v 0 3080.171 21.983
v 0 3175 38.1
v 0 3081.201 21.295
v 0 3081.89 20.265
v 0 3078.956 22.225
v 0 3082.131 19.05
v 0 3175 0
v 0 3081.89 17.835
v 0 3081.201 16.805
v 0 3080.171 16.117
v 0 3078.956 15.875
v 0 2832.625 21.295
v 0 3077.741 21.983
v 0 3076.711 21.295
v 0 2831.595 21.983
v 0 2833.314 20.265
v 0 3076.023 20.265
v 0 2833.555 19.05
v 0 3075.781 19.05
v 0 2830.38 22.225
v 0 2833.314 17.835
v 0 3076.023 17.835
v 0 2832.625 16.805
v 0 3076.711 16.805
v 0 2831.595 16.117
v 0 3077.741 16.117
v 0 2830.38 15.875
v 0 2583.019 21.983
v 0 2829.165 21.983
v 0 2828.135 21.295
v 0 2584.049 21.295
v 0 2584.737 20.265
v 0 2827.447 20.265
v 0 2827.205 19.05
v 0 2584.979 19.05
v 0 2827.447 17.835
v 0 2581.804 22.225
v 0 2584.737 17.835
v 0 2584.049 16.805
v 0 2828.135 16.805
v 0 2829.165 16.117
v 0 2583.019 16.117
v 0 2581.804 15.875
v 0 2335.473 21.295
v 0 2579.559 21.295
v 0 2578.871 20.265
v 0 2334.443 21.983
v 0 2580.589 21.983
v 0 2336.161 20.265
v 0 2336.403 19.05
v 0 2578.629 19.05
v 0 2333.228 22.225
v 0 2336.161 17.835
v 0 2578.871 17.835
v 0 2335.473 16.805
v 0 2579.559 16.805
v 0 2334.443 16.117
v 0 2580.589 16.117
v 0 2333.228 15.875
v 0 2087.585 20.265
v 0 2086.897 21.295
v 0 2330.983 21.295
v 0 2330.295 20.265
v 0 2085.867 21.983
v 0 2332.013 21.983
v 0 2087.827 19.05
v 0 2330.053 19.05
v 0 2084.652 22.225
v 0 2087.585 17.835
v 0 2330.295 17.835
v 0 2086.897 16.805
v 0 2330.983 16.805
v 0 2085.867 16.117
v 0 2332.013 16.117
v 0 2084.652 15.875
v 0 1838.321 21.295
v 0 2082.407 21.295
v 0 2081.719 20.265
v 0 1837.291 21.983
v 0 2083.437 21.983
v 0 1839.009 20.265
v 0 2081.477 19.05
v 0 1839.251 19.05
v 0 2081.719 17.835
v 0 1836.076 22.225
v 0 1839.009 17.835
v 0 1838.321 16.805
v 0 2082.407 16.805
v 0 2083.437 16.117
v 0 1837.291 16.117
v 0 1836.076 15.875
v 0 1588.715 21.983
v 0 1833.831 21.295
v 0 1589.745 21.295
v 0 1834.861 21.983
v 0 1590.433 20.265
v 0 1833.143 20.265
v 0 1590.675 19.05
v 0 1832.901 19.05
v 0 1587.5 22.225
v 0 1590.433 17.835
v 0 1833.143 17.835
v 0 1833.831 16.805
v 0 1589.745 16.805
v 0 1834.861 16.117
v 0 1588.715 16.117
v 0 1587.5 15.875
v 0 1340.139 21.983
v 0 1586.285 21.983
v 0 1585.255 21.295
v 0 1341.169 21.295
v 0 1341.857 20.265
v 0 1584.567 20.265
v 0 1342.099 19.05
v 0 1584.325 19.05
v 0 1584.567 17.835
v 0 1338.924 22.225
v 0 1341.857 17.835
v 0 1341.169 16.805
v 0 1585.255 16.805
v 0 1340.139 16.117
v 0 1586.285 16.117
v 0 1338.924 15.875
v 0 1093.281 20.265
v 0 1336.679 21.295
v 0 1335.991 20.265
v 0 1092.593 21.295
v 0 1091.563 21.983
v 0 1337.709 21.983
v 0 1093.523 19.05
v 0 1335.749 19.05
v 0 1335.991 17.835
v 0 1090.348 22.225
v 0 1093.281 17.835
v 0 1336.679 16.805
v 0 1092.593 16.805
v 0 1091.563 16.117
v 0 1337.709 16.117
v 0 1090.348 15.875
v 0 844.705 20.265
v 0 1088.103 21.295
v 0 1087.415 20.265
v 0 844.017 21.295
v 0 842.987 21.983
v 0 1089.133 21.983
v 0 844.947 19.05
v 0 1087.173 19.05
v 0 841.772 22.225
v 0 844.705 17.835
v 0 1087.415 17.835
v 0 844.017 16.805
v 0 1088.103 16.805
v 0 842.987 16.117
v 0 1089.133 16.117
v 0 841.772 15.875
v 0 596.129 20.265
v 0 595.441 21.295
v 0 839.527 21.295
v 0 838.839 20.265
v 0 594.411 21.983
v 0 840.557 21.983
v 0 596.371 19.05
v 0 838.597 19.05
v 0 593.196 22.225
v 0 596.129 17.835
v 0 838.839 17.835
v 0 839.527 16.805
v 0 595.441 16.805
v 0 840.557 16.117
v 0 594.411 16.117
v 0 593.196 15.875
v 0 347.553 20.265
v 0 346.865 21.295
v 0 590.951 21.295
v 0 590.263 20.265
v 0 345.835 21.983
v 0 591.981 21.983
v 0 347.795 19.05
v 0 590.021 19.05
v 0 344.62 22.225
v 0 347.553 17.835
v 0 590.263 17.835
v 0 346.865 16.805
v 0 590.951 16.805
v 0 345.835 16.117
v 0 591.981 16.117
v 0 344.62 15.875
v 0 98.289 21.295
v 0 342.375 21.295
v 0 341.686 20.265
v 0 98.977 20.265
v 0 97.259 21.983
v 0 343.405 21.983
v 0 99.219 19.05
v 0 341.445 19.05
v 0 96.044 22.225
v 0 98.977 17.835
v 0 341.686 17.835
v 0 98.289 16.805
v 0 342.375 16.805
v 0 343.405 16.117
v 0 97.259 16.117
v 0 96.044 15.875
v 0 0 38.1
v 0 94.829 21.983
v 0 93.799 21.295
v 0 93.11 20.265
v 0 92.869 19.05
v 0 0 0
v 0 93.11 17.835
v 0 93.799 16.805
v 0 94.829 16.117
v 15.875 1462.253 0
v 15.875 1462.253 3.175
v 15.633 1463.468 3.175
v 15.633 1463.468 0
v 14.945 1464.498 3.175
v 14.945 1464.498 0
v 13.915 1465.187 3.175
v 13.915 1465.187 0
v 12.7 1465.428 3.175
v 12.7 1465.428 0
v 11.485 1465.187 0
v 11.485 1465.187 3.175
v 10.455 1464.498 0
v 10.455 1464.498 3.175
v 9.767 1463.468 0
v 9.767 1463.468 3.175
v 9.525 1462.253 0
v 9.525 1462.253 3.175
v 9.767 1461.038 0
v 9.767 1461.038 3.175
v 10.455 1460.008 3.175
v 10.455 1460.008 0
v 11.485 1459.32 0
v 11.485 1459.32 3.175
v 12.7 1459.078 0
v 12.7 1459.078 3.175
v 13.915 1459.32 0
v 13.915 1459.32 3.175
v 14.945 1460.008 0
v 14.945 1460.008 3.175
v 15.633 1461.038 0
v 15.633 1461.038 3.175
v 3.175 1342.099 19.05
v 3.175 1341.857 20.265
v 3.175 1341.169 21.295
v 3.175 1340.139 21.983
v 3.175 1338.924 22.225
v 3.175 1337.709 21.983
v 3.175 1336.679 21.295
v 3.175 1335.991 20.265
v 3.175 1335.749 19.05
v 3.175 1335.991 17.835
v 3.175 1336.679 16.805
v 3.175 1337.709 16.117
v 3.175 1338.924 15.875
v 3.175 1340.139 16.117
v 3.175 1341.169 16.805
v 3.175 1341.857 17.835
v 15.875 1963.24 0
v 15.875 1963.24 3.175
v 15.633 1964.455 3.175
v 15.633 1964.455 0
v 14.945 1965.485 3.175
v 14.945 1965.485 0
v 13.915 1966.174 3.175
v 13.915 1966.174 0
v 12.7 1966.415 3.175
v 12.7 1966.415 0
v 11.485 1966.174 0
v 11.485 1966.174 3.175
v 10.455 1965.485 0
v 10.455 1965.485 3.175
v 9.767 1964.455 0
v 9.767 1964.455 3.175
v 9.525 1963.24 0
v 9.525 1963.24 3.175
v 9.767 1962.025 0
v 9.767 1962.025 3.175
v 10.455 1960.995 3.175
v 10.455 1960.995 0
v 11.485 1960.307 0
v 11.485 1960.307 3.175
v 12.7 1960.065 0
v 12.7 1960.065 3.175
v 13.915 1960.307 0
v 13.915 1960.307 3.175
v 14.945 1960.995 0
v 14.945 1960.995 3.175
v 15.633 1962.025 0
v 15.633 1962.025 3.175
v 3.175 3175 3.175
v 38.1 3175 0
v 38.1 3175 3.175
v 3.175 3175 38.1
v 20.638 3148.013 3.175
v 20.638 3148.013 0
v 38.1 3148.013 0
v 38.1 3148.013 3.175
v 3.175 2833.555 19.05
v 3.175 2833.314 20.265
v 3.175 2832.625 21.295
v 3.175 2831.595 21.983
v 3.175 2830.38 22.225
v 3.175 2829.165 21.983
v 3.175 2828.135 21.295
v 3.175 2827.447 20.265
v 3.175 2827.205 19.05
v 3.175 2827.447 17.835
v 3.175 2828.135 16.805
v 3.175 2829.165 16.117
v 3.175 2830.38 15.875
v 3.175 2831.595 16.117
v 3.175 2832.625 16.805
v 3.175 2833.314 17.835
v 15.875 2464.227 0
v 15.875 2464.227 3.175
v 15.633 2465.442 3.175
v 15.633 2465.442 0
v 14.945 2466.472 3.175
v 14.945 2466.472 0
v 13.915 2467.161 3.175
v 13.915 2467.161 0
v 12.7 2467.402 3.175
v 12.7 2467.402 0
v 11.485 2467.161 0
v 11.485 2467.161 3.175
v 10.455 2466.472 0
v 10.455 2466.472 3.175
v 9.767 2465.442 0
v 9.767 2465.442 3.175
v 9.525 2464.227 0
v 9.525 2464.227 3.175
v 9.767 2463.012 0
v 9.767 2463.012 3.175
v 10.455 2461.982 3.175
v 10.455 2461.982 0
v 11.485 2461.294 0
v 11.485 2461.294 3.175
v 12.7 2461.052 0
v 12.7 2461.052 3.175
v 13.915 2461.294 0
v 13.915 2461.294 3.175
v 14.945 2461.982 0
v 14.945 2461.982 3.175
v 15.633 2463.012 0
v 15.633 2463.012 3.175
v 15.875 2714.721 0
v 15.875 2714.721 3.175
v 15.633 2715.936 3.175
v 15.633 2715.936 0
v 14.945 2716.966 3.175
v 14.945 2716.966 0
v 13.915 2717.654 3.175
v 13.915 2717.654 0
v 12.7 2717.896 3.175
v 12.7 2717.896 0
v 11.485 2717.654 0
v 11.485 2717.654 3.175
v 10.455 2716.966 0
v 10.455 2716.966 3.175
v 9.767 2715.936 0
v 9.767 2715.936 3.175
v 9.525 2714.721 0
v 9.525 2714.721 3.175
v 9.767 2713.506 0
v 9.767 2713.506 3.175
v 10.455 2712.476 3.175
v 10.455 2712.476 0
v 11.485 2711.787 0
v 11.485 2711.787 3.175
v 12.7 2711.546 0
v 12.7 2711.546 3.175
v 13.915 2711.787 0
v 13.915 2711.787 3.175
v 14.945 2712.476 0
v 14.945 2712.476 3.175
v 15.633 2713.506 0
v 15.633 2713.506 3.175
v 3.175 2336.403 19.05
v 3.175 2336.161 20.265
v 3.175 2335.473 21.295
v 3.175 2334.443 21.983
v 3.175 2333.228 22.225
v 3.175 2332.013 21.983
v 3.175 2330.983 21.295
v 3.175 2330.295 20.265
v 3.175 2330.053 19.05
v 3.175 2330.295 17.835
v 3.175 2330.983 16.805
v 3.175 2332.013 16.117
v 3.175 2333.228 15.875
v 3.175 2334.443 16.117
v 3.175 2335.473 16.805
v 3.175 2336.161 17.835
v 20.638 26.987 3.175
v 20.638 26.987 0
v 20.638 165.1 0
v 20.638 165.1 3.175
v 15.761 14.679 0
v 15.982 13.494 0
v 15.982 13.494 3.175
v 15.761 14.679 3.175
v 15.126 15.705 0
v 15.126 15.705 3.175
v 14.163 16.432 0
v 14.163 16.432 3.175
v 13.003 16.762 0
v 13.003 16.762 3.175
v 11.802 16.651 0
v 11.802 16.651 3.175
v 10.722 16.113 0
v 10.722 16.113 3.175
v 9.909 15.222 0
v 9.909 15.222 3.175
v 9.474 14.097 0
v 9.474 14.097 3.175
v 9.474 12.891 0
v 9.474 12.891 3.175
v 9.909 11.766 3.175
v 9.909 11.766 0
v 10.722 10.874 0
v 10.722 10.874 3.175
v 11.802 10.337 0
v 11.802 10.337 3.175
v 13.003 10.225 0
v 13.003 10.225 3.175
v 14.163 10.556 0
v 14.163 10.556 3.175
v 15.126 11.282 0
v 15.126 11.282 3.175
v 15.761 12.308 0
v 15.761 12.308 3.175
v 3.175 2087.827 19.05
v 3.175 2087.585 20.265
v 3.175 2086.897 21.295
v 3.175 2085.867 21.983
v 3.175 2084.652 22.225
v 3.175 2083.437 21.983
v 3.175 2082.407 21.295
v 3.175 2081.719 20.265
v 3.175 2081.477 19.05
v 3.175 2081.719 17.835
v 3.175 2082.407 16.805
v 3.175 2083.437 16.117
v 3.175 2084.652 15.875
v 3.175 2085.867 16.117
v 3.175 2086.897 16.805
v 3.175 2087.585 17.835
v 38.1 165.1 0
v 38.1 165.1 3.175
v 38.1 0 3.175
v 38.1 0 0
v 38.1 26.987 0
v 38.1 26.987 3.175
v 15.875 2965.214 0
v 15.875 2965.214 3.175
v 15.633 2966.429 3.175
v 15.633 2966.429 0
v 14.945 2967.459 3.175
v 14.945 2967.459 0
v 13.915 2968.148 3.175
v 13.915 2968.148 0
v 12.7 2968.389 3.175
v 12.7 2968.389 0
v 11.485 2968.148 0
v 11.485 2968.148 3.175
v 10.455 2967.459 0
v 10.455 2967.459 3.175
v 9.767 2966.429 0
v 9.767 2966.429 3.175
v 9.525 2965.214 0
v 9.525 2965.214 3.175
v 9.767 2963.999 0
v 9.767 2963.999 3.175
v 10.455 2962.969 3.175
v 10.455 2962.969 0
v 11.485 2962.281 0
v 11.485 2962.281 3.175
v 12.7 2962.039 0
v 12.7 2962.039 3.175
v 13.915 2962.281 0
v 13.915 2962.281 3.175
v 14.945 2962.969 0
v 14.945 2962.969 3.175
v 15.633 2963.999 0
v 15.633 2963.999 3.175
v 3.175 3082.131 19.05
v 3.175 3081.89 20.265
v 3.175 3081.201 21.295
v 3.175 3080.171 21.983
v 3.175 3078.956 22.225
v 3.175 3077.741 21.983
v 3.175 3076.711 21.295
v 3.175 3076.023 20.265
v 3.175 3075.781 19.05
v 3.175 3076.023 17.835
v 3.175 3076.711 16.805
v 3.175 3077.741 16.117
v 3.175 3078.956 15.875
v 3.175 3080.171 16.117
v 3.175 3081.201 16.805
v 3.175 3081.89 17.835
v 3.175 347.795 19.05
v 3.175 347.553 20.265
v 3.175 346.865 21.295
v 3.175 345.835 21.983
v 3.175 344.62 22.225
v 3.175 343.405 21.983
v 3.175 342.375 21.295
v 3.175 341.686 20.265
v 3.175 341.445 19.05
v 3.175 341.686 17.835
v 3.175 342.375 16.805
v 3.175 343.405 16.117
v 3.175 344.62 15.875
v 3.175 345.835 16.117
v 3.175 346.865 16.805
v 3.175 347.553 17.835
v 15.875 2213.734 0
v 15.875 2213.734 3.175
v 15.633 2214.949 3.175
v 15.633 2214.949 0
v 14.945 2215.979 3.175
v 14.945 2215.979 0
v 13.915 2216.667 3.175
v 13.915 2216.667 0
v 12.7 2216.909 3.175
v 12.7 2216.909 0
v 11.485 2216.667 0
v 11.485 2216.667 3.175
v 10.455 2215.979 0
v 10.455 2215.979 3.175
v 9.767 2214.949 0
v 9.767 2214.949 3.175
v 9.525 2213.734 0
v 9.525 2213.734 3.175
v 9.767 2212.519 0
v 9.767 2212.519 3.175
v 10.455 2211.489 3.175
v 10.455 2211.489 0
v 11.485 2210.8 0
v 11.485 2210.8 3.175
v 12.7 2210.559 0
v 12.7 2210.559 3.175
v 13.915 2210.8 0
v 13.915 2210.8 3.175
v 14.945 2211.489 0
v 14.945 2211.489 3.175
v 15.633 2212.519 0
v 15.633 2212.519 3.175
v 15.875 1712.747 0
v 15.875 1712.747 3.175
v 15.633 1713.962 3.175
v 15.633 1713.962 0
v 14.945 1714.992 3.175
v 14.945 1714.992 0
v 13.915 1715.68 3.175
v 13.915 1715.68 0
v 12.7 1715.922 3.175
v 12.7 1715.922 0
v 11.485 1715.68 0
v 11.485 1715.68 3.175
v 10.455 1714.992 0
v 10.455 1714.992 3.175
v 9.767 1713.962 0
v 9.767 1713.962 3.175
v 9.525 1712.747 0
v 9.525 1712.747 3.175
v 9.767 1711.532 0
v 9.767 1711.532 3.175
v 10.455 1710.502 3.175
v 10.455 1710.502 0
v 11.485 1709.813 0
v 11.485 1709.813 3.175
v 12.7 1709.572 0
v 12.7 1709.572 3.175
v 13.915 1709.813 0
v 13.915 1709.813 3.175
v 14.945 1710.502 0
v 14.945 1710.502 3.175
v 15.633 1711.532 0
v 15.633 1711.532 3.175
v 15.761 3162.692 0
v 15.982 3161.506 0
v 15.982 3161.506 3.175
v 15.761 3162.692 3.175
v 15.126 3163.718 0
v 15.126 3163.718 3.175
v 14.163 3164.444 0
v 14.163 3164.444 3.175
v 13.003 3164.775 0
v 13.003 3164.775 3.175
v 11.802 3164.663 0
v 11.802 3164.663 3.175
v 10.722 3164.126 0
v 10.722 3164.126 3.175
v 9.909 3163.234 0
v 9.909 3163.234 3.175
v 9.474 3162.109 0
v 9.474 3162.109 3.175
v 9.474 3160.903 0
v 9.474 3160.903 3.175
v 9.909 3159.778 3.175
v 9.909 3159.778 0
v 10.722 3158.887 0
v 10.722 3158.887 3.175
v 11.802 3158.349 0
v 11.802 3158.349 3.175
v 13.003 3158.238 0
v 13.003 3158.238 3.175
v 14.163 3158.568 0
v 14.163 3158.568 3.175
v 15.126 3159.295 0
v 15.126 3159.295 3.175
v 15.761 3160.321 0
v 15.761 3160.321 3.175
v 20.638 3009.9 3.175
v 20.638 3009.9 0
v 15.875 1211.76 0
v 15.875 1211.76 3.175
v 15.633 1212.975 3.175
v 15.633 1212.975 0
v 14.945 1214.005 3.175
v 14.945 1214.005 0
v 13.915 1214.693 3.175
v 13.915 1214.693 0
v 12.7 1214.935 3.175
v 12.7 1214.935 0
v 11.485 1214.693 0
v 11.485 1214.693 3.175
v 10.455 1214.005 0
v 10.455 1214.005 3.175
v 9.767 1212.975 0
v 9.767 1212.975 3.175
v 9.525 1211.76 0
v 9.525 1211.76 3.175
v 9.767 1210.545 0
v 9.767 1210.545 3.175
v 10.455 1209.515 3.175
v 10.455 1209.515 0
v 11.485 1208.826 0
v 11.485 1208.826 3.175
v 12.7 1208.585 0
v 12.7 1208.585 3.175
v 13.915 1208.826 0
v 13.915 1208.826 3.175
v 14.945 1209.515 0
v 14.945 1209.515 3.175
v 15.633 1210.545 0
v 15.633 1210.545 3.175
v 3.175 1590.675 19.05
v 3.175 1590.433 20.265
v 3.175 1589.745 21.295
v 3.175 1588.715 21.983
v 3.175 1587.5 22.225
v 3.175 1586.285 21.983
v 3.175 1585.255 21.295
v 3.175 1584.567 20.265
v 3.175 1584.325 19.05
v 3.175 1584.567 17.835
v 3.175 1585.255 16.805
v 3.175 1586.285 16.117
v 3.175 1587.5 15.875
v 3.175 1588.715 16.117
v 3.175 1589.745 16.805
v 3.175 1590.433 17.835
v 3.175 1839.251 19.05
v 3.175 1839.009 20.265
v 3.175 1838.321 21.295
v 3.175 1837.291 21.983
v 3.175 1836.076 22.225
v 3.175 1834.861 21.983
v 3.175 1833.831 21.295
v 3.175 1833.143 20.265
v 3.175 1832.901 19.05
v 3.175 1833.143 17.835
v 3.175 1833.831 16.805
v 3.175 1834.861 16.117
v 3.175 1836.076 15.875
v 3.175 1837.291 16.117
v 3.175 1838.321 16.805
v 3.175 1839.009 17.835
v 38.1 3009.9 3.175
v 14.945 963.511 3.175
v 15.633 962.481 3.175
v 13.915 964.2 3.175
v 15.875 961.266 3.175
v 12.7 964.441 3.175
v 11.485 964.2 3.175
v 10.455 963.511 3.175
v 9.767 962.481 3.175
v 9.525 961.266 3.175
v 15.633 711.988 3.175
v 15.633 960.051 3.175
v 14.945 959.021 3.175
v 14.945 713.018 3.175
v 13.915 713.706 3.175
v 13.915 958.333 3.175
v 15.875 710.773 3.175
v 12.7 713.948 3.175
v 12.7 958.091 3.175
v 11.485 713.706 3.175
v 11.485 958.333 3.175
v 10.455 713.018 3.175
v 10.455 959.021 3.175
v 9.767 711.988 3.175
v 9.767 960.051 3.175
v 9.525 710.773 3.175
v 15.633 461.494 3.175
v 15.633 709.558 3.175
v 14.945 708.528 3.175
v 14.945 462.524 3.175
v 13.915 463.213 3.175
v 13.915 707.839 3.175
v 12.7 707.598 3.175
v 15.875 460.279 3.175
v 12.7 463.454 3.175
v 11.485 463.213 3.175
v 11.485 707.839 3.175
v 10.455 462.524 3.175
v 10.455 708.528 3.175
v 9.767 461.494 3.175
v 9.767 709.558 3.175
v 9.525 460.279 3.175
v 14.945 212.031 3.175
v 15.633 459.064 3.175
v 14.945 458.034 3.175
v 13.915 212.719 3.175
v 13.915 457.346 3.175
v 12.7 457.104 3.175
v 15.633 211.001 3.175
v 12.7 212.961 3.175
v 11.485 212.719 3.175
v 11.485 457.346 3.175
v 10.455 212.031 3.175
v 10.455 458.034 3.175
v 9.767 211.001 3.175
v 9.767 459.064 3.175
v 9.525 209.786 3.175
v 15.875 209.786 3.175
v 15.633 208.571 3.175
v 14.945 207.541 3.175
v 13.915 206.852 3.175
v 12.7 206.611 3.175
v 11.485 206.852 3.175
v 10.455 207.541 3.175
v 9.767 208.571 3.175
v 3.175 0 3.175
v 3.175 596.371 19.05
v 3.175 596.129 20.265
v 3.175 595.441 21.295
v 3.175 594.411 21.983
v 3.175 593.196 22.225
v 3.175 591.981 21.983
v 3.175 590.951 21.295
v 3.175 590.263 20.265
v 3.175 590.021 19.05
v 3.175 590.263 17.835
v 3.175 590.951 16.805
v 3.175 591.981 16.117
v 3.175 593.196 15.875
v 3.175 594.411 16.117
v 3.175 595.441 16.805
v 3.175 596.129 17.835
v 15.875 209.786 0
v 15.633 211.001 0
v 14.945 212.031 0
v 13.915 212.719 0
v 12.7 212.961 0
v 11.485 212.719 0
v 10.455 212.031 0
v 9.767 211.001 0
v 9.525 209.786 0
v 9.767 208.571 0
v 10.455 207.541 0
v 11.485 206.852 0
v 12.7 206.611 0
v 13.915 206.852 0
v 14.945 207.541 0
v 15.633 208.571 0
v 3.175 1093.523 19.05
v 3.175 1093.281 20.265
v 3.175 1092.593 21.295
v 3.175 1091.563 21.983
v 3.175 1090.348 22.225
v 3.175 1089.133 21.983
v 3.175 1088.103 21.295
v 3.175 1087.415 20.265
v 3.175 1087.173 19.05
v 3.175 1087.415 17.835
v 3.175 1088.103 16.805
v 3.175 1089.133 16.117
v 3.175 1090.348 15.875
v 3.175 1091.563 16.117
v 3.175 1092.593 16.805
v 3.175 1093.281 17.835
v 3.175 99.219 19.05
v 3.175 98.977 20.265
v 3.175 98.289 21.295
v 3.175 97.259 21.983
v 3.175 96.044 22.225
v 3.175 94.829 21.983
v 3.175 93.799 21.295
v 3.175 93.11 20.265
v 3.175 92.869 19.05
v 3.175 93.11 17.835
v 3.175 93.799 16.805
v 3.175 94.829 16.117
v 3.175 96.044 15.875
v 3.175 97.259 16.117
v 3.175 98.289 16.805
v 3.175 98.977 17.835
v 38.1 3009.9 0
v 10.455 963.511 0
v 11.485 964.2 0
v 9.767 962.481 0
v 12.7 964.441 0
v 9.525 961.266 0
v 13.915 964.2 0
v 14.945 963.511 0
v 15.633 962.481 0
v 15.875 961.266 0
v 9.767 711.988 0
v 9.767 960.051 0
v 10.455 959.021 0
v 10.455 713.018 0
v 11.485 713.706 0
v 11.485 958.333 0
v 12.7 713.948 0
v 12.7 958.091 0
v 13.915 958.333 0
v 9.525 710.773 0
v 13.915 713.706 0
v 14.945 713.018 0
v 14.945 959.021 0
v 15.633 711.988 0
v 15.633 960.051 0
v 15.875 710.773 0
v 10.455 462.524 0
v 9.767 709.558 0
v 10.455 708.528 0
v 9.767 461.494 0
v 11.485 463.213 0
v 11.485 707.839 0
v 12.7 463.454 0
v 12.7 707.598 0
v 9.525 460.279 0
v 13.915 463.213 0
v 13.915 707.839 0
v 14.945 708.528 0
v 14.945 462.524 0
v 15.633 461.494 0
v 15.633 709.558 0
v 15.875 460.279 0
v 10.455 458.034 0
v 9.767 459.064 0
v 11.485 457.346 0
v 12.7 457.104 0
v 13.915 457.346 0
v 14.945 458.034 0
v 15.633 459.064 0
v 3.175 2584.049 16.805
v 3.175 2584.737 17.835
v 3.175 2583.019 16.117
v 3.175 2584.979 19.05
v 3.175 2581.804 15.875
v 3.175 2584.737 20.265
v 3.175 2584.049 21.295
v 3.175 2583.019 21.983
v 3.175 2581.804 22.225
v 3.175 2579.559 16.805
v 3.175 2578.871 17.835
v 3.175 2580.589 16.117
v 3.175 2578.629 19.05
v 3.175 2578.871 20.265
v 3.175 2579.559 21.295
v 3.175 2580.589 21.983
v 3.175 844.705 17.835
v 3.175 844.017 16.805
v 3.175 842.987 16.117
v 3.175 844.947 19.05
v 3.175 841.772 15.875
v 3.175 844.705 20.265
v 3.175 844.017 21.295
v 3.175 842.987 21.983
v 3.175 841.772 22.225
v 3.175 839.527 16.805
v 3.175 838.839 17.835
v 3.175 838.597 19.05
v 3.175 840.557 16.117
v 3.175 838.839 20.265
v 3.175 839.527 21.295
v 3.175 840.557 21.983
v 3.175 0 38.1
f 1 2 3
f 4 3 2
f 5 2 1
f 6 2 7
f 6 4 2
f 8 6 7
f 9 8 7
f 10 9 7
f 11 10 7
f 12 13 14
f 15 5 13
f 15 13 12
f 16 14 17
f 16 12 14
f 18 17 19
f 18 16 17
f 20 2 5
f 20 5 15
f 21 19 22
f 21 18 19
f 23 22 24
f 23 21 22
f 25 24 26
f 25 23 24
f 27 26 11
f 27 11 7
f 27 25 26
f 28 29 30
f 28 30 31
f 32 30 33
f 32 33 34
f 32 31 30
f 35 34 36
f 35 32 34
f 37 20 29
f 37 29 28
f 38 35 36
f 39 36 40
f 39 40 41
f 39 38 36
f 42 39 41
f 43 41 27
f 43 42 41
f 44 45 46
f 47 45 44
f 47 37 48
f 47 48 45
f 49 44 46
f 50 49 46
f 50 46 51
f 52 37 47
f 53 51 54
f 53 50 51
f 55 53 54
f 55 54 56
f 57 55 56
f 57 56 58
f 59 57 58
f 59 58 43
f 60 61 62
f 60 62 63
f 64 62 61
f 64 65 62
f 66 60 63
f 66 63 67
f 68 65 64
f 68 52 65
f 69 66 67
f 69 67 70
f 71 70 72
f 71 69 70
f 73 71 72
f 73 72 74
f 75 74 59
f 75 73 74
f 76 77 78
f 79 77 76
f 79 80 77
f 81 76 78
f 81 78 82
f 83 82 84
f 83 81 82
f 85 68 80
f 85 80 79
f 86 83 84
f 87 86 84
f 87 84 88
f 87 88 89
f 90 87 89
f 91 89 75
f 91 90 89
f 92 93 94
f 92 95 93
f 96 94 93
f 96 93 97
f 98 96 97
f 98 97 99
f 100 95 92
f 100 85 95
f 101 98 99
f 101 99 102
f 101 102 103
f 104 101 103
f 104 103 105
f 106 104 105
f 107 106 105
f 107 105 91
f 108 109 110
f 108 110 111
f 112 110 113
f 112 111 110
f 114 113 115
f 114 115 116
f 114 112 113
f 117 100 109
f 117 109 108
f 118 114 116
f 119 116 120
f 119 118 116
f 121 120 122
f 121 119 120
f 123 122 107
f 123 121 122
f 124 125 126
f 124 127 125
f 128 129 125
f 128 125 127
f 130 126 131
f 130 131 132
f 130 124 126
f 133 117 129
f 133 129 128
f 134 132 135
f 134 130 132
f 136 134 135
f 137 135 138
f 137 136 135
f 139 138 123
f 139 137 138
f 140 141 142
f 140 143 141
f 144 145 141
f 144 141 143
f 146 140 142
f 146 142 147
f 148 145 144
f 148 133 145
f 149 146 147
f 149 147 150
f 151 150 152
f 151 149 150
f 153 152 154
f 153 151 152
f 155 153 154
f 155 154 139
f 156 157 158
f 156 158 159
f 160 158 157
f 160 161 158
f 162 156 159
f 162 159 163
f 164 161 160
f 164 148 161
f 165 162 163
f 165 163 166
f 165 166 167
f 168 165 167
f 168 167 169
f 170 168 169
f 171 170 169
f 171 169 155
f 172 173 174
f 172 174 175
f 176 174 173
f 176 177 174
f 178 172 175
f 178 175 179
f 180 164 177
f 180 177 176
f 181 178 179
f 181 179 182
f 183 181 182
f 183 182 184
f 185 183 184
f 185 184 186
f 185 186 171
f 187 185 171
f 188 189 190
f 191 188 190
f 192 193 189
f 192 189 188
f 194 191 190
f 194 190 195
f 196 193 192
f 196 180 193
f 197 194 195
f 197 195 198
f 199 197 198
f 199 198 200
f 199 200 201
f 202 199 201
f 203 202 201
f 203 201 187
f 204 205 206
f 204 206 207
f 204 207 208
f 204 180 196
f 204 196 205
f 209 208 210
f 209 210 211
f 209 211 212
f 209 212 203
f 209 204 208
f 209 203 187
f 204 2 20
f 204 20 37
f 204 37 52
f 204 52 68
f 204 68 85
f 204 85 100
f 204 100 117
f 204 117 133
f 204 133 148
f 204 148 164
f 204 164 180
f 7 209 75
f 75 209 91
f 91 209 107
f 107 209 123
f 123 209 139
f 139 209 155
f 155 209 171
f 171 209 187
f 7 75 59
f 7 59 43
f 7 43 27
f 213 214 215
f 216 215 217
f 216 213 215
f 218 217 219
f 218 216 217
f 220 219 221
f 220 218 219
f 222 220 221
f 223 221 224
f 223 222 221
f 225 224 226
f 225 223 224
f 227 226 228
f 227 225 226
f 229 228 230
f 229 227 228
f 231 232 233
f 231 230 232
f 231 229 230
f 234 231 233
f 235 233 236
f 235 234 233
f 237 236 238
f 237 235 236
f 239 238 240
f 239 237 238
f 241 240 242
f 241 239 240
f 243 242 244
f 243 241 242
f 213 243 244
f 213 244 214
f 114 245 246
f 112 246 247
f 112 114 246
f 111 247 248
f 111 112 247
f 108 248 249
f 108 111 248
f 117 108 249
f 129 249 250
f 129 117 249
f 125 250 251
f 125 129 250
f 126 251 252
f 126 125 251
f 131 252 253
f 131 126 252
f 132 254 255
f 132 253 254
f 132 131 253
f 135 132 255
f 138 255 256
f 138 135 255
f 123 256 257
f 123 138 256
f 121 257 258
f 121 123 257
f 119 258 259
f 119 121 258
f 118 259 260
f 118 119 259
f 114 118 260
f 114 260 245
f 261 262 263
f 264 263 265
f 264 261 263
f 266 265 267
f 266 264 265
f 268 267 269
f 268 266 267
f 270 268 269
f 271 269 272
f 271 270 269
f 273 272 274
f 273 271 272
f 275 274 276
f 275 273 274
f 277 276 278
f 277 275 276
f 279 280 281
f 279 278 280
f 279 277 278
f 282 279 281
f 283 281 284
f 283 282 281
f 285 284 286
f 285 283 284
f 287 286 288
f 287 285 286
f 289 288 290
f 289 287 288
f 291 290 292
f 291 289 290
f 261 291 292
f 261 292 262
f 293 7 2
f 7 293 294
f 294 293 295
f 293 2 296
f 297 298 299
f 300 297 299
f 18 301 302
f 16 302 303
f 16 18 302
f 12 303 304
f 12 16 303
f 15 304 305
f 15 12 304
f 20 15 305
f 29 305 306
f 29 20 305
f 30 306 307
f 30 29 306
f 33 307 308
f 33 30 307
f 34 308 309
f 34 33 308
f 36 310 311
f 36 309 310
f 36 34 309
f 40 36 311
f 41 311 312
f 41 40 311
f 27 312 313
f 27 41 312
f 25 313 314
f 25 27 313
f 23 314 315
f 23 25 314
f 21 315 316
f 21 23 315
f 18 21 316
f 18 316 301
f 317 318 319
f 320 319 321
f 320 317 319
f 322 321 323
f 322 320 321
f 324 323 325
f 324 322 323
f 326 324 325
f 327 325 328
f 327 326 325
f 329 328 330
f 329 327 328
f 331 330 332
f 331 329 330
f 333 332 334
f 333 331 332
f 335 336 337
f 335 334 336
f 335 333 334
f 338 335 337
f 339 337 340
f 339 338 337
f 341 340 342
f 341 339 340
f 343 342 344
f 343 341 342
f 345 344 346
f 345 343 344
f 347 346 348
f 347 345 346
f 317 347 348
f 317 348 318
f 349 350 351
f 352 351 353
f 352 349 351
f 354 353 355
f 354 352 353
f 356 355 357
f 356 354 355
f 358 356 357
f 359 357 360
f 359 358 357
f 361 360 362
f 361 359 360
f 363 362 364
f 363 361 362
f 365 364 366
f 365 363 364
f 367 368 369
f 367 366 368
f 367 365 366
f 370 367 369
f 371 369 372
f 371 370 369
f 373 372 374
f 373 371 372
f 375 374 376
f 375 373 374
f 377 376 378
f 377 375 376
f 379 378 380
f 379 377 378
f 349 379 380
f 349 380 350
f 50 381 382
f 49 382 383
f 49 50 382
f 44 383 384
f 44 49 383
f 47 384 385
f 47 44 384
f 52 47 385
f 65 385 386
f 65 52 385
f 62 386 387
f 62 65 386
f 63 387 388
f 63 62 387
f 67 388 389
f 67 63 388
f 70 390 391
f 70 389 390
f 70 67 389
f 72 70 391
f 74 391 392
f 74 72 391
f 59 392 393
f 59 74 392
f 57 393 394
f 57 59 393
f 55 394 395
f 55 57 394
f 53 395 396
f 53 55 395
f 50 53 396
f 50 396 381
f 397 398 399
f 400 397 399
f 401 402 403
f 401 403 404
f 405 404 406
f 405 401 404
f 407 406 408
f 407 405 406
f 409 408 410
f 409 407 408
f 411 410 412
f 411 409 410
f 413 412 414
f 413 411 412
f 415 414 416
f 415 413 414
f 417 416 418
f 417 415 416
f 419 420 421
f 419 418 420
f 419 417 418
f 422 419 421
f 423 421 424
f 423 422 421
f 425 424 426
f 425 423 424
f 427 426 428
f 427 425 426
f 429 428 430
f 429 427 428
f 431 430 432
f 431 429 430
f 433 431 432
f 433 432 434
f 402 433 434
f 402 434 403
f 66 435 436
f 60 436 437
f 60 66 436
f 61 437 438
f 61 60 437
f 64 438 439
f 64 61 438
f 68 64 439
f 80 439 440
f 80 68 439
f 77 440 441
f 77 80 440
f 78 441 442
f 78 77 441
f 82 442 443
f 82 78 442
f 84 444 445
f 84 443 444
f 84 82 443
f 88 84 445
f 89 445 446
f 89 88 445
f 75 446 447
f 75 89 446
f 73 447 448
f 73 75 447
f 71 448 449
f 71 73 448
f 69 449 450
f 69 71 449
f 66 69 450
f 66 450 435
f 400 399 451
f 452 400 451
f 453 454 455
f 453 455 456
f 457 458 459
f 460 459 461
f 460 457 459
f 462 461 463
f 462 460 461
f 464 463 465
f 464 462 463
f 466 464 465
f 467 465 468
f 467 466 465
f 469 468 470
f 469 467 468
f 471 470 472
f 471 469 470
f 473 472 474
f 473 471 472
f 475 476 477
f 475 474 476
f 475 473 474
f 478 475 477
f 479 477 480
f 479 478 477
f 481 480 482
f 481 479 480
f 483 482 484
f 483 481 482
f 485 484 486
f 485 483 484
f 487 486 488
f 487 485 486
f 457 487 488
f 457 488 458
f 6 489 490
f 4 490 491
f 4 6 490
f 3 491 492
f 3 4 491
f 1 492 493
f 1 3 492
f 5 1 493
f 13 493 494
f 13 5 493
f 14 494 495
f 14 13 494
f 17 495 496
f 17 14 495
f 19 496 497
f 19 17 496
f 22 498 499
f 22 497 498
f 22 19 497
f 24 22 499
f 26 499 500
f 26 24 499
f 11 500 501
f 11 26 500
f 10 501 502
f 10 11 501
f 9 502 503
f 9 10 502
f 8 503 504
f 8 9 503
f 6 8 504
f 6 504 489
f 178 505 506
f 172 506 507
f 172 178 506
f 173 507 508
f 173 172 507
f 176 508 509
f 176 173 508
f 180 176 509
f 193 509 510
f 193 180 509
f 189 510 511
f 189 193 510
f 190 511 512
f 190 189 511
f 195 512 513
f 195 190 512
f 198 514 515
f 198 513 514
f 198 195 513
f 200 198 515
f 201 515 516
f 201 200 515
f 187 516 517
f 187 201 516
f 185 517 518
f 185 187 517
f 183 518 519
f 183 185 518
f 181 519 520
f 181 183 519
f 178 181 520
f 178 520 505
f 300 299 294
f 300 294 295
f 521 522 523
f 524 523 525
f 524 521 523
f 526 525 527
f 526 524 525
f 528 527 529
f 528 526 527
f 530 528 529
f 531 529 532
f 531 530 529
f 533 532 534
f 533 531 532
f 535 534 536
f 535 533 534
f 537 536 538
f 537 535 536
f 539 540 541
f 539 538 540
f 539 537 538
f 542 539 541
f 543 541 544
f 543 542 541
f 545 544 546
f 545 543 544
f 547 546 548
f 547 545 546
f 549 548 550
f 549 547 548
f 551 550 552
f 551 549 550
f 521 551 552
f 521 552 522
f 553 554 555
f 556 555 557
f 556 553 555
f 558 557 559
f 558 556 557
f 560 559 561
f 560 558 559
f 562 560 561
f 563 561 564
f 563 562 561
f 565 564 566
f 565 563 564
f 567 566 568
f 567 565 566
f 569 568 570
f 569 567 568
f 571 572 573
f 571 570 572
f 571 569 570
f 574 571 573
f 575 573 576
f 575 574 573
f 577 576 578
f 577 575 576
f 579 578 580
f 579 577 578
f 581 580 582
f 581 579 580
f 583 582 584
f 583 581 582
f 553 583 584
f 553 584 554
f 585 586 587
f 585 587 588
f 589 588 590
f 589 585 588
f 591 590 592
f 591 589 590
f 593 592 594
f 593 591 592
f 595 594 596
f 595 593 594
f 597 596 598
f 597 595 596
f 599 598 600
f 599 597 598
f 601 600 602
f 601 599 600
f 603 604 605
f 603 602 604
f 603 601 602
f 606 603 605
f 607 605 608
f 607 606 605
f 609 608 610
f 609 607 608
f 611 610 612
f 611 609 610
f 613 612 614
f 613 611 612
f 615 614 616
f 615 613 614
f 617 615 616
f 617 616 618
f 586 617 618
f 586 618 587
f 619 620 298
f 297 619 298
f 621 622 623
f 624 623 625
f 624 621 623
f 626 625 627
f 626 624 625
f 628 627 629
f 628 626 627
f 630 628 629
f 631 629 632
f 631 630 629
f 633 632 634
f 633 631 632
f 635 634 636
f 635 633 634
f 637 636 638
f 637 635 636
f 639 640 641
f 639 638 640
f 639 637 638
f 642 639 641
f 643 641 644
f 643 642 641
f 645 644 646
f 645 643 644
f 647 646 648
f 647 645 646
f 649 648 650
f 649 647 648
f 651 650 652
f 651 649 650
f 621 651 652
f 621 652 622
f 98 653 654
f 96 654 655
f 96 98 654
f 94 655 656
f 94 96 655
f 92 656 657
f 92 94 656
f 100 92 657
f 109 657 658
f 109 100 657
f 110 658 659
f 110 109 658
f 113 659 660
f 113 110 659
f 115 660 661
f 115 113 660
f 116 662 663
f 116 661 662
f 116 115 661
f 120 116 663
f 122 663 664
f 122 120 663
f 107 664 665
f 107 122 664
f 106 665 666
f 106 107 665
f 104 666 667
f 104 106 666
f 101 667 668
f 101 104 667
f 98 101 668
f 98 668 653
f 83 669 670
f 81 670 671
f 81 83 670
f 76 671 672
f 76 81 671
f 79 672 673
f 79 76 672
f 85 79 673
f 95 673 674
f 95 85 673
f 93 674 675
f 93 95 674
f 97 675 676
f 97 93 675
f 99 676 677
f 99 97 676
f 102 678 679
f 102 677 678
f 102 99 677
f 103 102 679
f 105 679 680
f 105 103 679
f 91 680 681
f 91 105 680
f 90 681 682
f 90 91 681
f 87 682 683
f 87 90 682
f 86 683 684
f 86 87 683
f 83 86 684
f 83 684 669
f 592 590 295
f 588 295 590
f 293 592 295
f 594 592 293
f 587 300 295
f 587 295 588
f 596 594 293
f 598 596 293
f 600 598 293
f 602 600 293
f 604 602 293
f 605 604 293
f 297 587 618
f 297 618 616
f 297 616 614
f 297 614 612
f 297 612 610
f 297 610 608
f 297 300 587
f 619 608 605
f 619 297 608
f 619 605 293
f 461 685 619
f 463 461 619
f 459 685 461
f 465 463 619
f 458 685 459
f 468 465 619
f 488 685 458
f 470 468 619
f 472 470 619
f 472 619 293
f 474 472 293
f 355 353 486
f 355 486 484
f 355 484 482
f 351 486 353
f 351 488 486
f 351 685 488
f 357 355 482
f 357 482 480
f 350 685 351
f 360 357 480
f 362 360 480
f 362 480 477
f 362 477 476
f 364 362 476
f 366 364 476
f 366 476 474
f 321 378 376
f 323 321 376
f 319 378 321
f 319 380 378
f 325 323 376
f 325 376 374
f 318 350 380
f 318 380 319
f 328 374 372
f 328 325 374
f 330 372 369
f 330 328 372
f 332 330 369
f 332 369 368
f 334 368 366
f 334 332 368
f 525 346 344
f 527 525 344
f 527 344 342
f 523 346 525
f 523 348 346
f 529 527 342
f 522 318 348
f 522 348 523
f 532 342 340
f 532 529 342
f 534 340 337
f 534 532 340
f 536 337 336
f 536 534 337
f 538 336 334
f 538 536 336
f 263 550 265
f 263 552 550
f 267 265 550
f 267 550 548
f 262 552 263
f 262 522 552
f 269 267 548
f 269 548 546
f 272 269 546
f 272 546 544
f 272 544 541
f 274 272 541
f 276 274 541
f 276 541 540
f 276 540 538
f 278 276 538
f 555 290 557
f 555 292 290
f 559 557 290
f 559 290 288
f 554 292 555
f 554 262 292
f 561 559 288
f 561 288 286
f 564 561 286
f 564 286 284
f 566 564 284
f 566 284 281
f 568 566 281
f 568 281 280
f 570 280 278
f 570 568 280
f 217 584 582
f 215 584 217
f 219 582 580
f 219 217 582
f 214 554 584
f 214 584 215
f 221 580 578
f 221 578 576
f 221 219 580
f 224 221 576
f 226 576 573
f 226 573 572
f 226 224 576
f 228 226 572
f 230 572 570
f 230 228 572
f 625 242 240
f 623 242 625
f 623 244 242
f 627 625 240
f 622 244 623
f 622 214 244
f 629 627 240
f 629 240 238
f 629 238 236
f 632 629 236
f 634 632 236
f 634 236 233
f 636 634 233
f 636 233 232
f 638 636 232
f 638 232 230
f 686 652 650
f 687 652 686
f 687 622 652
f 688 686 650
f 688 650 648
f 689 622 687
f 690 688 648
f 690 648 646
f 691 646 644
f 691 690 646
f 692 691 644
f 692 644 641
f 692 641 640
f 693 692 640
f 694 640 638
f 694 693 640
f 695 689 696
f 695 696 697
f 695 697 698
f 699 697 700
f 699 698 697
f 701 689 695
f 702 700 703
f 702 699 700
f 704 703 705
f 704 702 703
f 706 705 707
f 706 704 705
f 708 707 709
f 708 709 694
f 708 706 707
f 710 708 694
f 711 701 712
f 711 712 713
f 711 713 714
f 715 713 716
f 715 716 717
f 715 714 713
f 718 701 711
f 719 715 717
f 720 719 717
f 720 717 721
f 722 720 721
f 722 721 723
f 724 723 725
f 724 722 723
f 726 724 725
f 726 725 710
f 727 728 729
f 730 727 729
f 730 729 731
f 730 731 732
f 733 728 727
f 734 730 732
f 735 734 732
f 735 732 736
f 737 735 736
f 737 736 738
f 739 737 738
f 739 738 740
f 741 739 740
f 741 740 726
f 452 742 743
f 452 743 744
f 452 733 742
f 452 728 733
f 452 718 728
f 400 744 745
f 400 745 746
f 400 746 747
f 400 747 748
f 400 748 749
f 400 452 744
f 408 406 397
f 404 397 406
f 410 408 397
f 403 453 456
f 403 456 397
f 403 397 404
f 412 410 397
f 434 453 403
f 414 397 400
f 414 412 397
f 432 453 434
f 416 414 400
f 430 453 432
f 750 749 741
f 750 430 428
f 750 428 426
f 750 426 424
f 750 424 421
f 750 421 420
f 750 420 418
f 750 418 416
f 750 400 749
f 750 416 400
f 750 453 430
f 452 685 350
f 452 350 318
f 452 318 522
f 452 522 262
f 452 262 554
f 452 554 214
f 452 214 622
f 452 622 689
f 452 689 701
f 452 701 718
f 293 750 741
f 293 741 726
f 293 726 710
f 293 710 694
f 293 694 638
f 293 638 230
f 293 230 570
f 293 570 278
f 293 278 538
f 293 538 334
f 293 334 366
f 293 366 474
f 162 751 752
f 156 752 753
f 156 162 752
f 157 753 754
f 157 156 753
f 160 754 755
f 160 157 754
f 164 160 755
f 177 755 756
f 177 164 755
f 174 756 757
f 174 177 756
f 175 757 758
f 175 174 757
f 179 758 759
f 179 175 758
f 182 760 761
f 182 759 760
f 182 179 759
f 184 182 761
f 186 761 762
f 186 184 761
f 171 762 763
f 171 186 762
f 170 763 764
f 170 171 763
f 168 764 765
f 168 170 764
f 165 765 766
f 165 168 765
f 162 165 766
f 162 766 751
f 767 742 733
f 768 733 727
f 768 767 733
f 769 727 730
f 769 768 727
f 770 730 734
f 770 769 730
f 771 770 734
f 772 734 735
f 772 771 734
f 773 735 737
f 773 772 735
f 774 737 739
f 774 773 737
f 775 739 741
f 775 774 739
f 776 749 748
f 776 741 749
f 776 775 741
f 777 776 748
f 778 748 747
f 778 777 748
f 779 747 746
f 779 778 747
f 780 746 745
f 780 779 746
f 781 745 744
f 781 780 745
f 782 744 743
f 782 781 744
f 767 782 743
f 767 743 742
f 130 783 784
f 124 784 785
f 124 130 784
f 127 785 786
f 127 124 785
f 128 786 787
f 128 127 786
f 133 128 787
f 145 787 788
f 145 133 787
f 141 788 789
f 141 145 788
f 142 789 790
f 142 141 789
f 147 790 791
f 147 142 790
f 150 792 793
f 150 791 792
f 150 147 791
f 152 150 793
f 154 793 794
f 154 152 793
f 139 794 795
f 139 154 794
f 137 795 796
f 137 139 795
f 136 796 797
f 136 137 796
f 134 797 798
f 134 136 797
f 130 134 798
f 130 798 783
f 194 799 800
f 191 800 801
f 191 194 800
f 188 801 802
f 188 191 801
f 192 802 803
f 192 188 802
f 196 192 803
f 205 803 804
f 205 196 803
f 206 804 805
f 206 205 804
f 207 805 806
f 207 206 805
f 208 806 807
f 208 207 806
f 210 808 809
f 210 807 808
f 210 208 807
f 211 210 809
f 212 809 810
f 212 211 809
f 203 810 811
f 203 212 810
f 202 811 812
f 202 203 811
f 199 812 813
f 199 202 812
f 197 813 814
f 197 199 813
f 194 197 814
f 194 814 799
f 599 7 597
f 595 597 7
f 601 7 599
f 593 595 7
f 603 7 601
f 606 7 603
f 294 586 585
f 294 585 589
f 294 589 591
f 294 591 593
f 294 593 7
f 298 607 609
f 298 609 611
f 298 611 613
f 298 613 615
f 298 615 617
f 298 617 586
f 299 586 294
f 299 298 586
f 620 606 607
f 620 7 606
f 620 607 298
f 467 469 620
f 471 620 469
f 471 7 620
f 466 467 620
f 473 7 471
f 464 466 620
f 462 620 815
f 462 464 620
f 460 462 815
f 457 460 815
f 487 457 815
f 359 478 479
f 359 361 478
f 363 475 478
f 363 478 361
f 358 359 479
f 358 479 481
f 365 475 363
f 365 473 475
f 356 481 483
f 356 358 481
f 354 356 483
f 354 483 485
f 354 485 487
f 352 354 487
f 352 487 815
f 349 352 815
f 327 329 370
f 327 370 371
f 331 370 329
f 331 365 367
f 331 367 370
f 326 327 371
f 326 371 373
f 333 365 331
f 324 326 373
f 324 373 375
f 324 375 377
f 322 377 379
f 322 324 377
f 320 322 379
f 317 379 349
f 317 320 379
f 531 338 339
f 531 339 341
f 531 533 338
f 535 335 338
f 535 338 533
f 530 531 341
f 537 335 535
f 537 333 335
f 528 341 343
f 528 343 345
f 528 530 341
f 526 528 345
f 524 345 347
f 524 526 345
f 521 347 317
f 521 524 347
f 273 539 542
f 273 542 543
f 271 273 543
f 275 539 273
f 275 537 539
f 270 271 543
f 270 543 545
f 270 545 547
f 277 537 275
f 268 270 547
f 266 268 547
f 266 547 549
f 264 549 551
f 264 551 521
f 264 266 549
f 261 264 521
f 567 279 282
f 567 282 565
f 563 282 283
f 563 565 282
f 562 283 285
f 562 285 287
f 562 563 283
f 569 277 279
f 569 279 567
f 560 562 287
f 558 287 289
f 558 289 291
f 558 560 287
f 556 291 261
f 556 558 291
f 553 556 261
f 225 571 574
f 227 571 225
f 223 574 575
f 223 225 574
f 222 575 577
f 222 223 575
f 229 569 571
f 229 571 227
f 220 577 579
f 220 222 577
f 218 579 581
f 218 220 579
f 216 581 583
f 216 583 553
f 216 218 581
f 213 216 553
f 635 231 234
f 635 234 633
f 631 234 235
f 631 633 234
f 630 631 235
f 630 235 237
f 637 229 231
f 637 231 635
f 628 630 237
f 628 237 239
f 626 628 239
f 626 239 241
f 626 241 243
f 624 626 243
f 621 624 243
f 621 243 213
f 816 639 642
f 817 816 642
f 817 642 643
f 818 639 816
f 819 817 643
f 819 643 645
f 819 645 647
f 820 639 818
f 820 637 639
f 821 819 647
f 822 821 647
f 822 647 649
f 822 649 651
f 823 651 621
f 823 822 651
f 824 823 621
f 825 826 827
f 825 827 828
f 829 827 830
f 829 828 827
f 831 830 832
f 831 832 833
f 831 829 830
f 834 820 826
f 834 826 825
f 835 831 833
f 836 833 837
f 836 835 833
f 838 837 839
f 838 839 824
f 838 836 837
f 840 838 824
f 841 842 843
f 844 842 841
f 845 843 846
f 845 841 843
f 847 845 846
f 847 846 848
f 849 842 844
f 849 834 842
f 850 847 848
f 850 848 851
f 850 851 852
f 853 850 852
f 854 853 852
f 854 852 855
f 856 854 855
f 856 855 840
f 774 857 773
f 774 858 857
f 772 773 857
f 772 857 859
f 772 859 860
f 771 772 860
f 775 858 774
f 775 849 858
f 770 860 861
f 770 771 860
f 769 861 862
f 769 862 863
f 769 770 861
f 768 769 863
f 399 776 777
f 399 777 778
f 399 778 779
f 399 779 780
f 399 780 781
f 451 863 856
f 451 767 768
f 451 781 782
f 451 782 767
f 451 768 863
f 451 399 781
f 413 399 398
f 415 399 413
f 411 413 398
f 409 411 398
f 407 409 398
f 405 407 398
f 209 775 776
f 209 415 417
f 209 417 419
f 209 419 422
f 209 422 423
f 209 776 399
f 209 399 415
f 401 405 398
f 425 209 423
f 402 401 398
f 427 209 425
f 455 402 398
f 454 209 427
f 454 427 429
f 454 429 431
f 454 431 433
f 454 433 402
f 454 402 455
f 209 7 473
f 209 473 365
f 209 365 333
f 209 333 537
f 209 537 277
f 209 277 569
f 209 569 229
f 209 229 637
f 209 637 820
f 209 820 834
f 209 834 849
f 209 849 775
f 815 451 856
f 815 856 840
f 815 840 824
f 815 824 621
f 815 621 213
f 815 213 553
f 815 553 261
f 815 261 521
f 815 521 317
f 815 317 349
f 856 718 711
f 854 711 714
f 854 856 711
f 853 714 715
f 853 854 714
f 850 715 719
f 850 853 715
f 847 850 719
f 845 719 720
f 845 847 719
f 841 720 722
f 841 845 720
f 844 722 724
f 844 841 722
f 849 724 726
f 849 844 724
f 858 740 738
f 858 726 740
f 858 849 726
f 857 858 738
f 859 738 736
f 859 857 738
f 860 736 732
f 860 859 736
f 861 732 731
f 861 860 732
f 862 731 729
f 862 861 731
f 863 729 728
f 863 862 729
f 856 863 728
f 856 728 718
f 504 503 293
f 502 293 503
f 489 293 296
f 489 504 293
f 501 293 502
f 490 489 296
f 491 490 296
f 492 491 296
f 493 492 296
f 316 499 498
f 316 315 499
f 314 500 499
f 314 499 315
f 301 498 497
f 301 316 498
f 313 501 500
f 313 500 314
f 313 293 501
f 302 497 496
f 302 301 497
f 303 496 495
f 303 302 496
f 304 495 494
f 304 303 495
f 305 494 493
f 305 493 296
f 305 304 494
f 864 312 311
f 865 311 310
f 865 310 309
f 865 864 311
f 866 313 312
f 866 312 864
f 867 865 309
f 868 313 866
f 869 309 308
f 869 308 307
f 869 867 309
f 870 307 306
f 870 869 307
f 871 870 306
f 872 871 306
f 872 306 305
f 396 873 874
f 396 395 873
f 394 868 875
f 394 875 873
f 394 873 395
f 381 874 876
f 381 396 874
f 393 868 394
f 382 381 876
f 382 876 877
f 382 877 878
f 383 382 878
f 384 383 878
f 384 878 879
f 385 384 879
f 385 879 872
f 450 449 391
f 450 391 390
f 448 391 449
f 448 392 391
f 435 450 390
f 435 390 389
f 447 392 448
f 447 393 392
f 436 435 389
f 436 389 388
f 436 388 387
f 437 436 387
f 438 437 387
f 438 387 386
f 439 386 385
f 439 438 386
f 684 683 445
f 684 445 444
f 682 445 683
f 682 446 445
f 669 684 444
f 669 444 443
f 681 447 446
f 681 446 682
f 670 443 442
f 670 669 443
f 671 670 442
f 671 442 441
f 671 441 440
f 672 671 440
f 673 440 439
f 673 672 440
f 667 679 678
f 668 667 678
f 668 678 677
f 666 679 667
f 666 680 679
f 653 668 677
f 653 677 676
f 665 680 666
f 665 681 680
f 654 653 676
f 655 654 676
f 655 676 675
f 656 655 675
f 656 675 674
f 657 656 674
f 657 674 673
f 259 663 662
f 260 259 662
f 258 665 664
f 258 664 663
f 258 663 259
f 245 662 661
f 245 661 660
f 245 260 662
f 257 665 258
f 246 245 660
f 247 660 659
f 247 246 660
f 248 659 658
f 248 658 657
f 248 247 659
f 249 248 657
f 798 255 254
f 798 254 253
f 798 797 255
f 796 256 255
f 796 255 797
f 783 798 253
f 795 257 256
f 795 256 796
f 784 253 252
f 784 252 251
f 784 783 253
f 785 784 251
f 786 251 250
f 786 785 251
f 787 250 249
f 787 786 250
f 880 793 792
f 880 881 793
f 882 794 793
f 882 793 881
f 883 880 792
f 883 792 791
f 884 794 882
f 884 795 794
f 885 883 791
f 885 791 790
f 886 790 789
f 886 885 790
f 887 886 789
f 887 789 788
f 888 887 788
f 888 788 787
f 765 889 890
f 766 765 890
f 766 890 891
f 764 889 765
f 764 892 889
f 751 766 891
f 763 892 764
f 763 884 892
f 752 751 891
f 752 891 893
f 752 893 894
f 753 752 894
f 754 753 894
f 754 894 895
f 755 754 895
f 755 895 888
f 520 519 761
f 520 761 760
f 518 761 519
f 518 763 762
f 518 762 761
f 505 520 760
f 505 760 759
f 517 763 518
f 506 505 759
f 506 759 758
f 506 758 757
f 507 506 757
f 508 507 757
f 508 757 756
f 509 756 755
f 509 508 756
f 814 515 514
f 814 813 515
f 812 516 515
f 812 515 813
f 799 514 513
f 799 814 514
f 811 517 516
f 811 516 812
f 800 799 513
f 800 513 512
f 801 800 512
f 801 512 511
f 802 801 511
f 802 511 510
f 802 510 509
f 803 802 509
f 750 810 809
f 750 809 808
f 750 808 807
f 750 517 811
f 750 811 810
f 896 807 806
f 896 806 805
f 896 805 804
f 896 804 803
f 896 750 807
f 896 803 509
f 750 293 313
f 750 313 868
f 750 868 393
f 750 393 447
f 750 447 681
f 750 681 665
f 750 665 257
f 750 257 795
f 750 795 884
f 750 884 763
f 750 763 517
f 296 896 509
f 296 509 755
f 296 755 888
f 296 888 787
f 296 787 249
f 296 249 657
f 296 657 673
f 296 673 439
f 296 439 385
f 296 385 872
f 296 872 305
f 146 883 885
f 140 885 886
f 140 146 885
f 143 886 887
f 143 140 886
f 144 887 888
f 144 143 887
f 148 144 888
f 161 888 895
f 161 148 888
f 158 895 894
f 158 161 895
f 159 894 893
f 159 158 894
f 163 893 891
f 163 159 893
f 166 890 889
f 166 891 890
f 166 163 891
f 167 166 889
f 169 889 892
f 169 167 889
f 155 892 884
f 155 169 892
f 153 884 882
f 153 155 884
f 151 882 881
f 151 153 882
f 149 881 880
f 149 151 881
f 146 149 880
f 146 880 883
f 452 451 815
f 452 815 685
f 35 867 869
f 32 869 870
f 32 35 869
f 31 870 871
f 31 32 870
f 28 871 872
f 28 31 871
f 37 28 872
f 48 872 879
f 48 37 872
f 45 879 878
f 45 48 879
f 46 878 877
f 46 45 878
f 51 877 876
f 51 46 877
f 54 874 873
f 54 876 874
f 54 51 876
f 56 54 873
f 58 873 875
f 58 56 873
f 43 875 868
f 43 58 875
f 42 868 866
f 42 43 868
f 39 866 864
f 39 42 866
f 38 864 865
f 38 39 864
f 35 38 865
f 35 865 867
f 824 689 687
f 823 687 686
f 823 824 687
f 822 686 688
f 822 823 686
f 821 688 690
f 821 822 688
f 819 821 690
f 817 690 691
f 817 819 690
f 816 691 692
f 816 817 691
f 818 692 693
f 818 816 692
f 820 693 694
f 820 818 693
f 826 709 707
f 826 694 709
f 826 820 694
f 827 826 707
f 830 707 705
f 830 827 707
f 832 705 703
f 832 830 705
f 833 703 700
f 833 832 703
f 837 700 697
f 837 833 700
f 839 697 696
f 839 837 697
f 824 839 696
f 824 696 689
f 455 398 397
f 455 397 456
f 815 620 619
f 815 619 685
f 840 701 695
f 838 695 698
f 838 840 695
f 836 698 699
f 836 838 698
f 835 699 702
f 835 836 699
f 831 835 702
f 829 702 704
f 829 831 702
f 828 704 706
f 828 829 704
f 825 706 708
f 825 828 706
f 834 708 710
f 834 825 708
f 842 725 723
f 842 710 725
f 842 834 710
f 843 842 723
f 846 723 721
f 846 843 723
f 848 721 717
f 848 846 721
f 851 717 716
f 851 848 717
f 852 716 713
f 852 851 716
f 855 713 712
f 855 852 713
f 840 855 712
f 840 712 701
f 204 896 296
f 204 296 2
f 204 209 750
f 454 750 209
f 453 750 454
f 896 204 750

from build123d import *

# Parameters (mm, degrees)
F1_DEPTH  = 3175
F6_R      = 3.175
F8_W      = 17.4625
F8_H      = 138.1125
F8_R      = 3.282293
F9_DEPTH  = 25.4
F7_R      = 3.175
F10_DEPTH = 25.4


with BuildPart() as f1:
    # F0 (on Front) → F1 (new body)
    with BuildSketch(Plane.XZ):
        Polygon((0, 38.1), (0, 0), (38.1, 0), (38.1, 3.175), (3.175, 3.175), (3.175, 38.1), align=None)
    extrude(amount=-F1_DEPTH)

    # F6 (on Top) + F8 (on Top) → F9 (cut)
    with BuildSketch(Plane.XY):
        with Locations((12.7, 209.785697)):
            Circle(F6_R)
        with Locations((12.7, 460.279207)):
            Circle(F6_R)
        with Locations((12.7, 710.772716)):
            Circle(F6_R)
        with Locations((12.7, 961.266226)):
            Circle(F6_R)
        with Locations((12.7, 1211.759736)):
            Circle(F6_R)
        with Locations((12.7, 1462.253245)):
            Circle(F6_R)
        with Locations((12.7, 1712.746755)):
            Circle(F6_R)
        with Locations((12.7, 1963.240264)):
            Circle(F6_R)
        with Locations((12.7, 2213.733774)):
            Circle(F6_R)
        with Locations((12.7, 2464.227284)):
            Circle(F6_R)
        with Locations((12.7, 2714.720793)):
            Circle(F6_R)
        with Locations((12.7, 2965.214303)):
            Circle(F6_R)
    with BuildSketch(Plane.XY):
        with Locations((29.36875, 96.04375)):
            Rectangle(F8_W, F8_H)
        with Locations((12.7, 13.49375)):
            Circle(F8_R)
        with Locations((29.36875, 3078.95625)):
            Rectangle(F8_W, F8_H)
        with Locations((12.7, 3161.50625)):
            Circle(F8_R)
    extrude(amount=F9_DEPTH, mode=Mode.SUBTRACT)

    # F7 (on Right) → F10 (cut)
    with BuildSketch(Plane.YZ):
        with Locations((96.04375, 19.05)):
            Circle(F7_R)
        with Locations((344.619792, 19.05)):
            Circle(F7_R)
        with Locations((593.195833, 19.05)):
            Circle(F7_R)
        with Locations((841.771875, 19.05)):
            Circle(F7_R)
        with Locations((1090.347917, 19.05)):
            Circle(F7_R)
        with Locations((1338.923958, 19.05)):
            Circle(F7_R)
        with Locations((1587.5, 19.05)):
            Circle(F7_R)
        with Locations((1836.076042, 19.05)):
            Circle(F7_R)
        with Locations((2084.652083, 19.05)):
            Circle(F7_R)
        with Locations((2333.228125, 19.05)):
            Circle(F7_R)
        with Locations((2581.804167, 19.05)):
            Circle(F7_R)
        with Locations((2830.380208, 19.05)):
            Circle(F7_R)
        with Locations((3078.95625, 19.05)):
            Circle(F7_R)
    extrude(amount=F10_DEPTH, mode=Mode.SUBTRACT)


solid = f1.part
